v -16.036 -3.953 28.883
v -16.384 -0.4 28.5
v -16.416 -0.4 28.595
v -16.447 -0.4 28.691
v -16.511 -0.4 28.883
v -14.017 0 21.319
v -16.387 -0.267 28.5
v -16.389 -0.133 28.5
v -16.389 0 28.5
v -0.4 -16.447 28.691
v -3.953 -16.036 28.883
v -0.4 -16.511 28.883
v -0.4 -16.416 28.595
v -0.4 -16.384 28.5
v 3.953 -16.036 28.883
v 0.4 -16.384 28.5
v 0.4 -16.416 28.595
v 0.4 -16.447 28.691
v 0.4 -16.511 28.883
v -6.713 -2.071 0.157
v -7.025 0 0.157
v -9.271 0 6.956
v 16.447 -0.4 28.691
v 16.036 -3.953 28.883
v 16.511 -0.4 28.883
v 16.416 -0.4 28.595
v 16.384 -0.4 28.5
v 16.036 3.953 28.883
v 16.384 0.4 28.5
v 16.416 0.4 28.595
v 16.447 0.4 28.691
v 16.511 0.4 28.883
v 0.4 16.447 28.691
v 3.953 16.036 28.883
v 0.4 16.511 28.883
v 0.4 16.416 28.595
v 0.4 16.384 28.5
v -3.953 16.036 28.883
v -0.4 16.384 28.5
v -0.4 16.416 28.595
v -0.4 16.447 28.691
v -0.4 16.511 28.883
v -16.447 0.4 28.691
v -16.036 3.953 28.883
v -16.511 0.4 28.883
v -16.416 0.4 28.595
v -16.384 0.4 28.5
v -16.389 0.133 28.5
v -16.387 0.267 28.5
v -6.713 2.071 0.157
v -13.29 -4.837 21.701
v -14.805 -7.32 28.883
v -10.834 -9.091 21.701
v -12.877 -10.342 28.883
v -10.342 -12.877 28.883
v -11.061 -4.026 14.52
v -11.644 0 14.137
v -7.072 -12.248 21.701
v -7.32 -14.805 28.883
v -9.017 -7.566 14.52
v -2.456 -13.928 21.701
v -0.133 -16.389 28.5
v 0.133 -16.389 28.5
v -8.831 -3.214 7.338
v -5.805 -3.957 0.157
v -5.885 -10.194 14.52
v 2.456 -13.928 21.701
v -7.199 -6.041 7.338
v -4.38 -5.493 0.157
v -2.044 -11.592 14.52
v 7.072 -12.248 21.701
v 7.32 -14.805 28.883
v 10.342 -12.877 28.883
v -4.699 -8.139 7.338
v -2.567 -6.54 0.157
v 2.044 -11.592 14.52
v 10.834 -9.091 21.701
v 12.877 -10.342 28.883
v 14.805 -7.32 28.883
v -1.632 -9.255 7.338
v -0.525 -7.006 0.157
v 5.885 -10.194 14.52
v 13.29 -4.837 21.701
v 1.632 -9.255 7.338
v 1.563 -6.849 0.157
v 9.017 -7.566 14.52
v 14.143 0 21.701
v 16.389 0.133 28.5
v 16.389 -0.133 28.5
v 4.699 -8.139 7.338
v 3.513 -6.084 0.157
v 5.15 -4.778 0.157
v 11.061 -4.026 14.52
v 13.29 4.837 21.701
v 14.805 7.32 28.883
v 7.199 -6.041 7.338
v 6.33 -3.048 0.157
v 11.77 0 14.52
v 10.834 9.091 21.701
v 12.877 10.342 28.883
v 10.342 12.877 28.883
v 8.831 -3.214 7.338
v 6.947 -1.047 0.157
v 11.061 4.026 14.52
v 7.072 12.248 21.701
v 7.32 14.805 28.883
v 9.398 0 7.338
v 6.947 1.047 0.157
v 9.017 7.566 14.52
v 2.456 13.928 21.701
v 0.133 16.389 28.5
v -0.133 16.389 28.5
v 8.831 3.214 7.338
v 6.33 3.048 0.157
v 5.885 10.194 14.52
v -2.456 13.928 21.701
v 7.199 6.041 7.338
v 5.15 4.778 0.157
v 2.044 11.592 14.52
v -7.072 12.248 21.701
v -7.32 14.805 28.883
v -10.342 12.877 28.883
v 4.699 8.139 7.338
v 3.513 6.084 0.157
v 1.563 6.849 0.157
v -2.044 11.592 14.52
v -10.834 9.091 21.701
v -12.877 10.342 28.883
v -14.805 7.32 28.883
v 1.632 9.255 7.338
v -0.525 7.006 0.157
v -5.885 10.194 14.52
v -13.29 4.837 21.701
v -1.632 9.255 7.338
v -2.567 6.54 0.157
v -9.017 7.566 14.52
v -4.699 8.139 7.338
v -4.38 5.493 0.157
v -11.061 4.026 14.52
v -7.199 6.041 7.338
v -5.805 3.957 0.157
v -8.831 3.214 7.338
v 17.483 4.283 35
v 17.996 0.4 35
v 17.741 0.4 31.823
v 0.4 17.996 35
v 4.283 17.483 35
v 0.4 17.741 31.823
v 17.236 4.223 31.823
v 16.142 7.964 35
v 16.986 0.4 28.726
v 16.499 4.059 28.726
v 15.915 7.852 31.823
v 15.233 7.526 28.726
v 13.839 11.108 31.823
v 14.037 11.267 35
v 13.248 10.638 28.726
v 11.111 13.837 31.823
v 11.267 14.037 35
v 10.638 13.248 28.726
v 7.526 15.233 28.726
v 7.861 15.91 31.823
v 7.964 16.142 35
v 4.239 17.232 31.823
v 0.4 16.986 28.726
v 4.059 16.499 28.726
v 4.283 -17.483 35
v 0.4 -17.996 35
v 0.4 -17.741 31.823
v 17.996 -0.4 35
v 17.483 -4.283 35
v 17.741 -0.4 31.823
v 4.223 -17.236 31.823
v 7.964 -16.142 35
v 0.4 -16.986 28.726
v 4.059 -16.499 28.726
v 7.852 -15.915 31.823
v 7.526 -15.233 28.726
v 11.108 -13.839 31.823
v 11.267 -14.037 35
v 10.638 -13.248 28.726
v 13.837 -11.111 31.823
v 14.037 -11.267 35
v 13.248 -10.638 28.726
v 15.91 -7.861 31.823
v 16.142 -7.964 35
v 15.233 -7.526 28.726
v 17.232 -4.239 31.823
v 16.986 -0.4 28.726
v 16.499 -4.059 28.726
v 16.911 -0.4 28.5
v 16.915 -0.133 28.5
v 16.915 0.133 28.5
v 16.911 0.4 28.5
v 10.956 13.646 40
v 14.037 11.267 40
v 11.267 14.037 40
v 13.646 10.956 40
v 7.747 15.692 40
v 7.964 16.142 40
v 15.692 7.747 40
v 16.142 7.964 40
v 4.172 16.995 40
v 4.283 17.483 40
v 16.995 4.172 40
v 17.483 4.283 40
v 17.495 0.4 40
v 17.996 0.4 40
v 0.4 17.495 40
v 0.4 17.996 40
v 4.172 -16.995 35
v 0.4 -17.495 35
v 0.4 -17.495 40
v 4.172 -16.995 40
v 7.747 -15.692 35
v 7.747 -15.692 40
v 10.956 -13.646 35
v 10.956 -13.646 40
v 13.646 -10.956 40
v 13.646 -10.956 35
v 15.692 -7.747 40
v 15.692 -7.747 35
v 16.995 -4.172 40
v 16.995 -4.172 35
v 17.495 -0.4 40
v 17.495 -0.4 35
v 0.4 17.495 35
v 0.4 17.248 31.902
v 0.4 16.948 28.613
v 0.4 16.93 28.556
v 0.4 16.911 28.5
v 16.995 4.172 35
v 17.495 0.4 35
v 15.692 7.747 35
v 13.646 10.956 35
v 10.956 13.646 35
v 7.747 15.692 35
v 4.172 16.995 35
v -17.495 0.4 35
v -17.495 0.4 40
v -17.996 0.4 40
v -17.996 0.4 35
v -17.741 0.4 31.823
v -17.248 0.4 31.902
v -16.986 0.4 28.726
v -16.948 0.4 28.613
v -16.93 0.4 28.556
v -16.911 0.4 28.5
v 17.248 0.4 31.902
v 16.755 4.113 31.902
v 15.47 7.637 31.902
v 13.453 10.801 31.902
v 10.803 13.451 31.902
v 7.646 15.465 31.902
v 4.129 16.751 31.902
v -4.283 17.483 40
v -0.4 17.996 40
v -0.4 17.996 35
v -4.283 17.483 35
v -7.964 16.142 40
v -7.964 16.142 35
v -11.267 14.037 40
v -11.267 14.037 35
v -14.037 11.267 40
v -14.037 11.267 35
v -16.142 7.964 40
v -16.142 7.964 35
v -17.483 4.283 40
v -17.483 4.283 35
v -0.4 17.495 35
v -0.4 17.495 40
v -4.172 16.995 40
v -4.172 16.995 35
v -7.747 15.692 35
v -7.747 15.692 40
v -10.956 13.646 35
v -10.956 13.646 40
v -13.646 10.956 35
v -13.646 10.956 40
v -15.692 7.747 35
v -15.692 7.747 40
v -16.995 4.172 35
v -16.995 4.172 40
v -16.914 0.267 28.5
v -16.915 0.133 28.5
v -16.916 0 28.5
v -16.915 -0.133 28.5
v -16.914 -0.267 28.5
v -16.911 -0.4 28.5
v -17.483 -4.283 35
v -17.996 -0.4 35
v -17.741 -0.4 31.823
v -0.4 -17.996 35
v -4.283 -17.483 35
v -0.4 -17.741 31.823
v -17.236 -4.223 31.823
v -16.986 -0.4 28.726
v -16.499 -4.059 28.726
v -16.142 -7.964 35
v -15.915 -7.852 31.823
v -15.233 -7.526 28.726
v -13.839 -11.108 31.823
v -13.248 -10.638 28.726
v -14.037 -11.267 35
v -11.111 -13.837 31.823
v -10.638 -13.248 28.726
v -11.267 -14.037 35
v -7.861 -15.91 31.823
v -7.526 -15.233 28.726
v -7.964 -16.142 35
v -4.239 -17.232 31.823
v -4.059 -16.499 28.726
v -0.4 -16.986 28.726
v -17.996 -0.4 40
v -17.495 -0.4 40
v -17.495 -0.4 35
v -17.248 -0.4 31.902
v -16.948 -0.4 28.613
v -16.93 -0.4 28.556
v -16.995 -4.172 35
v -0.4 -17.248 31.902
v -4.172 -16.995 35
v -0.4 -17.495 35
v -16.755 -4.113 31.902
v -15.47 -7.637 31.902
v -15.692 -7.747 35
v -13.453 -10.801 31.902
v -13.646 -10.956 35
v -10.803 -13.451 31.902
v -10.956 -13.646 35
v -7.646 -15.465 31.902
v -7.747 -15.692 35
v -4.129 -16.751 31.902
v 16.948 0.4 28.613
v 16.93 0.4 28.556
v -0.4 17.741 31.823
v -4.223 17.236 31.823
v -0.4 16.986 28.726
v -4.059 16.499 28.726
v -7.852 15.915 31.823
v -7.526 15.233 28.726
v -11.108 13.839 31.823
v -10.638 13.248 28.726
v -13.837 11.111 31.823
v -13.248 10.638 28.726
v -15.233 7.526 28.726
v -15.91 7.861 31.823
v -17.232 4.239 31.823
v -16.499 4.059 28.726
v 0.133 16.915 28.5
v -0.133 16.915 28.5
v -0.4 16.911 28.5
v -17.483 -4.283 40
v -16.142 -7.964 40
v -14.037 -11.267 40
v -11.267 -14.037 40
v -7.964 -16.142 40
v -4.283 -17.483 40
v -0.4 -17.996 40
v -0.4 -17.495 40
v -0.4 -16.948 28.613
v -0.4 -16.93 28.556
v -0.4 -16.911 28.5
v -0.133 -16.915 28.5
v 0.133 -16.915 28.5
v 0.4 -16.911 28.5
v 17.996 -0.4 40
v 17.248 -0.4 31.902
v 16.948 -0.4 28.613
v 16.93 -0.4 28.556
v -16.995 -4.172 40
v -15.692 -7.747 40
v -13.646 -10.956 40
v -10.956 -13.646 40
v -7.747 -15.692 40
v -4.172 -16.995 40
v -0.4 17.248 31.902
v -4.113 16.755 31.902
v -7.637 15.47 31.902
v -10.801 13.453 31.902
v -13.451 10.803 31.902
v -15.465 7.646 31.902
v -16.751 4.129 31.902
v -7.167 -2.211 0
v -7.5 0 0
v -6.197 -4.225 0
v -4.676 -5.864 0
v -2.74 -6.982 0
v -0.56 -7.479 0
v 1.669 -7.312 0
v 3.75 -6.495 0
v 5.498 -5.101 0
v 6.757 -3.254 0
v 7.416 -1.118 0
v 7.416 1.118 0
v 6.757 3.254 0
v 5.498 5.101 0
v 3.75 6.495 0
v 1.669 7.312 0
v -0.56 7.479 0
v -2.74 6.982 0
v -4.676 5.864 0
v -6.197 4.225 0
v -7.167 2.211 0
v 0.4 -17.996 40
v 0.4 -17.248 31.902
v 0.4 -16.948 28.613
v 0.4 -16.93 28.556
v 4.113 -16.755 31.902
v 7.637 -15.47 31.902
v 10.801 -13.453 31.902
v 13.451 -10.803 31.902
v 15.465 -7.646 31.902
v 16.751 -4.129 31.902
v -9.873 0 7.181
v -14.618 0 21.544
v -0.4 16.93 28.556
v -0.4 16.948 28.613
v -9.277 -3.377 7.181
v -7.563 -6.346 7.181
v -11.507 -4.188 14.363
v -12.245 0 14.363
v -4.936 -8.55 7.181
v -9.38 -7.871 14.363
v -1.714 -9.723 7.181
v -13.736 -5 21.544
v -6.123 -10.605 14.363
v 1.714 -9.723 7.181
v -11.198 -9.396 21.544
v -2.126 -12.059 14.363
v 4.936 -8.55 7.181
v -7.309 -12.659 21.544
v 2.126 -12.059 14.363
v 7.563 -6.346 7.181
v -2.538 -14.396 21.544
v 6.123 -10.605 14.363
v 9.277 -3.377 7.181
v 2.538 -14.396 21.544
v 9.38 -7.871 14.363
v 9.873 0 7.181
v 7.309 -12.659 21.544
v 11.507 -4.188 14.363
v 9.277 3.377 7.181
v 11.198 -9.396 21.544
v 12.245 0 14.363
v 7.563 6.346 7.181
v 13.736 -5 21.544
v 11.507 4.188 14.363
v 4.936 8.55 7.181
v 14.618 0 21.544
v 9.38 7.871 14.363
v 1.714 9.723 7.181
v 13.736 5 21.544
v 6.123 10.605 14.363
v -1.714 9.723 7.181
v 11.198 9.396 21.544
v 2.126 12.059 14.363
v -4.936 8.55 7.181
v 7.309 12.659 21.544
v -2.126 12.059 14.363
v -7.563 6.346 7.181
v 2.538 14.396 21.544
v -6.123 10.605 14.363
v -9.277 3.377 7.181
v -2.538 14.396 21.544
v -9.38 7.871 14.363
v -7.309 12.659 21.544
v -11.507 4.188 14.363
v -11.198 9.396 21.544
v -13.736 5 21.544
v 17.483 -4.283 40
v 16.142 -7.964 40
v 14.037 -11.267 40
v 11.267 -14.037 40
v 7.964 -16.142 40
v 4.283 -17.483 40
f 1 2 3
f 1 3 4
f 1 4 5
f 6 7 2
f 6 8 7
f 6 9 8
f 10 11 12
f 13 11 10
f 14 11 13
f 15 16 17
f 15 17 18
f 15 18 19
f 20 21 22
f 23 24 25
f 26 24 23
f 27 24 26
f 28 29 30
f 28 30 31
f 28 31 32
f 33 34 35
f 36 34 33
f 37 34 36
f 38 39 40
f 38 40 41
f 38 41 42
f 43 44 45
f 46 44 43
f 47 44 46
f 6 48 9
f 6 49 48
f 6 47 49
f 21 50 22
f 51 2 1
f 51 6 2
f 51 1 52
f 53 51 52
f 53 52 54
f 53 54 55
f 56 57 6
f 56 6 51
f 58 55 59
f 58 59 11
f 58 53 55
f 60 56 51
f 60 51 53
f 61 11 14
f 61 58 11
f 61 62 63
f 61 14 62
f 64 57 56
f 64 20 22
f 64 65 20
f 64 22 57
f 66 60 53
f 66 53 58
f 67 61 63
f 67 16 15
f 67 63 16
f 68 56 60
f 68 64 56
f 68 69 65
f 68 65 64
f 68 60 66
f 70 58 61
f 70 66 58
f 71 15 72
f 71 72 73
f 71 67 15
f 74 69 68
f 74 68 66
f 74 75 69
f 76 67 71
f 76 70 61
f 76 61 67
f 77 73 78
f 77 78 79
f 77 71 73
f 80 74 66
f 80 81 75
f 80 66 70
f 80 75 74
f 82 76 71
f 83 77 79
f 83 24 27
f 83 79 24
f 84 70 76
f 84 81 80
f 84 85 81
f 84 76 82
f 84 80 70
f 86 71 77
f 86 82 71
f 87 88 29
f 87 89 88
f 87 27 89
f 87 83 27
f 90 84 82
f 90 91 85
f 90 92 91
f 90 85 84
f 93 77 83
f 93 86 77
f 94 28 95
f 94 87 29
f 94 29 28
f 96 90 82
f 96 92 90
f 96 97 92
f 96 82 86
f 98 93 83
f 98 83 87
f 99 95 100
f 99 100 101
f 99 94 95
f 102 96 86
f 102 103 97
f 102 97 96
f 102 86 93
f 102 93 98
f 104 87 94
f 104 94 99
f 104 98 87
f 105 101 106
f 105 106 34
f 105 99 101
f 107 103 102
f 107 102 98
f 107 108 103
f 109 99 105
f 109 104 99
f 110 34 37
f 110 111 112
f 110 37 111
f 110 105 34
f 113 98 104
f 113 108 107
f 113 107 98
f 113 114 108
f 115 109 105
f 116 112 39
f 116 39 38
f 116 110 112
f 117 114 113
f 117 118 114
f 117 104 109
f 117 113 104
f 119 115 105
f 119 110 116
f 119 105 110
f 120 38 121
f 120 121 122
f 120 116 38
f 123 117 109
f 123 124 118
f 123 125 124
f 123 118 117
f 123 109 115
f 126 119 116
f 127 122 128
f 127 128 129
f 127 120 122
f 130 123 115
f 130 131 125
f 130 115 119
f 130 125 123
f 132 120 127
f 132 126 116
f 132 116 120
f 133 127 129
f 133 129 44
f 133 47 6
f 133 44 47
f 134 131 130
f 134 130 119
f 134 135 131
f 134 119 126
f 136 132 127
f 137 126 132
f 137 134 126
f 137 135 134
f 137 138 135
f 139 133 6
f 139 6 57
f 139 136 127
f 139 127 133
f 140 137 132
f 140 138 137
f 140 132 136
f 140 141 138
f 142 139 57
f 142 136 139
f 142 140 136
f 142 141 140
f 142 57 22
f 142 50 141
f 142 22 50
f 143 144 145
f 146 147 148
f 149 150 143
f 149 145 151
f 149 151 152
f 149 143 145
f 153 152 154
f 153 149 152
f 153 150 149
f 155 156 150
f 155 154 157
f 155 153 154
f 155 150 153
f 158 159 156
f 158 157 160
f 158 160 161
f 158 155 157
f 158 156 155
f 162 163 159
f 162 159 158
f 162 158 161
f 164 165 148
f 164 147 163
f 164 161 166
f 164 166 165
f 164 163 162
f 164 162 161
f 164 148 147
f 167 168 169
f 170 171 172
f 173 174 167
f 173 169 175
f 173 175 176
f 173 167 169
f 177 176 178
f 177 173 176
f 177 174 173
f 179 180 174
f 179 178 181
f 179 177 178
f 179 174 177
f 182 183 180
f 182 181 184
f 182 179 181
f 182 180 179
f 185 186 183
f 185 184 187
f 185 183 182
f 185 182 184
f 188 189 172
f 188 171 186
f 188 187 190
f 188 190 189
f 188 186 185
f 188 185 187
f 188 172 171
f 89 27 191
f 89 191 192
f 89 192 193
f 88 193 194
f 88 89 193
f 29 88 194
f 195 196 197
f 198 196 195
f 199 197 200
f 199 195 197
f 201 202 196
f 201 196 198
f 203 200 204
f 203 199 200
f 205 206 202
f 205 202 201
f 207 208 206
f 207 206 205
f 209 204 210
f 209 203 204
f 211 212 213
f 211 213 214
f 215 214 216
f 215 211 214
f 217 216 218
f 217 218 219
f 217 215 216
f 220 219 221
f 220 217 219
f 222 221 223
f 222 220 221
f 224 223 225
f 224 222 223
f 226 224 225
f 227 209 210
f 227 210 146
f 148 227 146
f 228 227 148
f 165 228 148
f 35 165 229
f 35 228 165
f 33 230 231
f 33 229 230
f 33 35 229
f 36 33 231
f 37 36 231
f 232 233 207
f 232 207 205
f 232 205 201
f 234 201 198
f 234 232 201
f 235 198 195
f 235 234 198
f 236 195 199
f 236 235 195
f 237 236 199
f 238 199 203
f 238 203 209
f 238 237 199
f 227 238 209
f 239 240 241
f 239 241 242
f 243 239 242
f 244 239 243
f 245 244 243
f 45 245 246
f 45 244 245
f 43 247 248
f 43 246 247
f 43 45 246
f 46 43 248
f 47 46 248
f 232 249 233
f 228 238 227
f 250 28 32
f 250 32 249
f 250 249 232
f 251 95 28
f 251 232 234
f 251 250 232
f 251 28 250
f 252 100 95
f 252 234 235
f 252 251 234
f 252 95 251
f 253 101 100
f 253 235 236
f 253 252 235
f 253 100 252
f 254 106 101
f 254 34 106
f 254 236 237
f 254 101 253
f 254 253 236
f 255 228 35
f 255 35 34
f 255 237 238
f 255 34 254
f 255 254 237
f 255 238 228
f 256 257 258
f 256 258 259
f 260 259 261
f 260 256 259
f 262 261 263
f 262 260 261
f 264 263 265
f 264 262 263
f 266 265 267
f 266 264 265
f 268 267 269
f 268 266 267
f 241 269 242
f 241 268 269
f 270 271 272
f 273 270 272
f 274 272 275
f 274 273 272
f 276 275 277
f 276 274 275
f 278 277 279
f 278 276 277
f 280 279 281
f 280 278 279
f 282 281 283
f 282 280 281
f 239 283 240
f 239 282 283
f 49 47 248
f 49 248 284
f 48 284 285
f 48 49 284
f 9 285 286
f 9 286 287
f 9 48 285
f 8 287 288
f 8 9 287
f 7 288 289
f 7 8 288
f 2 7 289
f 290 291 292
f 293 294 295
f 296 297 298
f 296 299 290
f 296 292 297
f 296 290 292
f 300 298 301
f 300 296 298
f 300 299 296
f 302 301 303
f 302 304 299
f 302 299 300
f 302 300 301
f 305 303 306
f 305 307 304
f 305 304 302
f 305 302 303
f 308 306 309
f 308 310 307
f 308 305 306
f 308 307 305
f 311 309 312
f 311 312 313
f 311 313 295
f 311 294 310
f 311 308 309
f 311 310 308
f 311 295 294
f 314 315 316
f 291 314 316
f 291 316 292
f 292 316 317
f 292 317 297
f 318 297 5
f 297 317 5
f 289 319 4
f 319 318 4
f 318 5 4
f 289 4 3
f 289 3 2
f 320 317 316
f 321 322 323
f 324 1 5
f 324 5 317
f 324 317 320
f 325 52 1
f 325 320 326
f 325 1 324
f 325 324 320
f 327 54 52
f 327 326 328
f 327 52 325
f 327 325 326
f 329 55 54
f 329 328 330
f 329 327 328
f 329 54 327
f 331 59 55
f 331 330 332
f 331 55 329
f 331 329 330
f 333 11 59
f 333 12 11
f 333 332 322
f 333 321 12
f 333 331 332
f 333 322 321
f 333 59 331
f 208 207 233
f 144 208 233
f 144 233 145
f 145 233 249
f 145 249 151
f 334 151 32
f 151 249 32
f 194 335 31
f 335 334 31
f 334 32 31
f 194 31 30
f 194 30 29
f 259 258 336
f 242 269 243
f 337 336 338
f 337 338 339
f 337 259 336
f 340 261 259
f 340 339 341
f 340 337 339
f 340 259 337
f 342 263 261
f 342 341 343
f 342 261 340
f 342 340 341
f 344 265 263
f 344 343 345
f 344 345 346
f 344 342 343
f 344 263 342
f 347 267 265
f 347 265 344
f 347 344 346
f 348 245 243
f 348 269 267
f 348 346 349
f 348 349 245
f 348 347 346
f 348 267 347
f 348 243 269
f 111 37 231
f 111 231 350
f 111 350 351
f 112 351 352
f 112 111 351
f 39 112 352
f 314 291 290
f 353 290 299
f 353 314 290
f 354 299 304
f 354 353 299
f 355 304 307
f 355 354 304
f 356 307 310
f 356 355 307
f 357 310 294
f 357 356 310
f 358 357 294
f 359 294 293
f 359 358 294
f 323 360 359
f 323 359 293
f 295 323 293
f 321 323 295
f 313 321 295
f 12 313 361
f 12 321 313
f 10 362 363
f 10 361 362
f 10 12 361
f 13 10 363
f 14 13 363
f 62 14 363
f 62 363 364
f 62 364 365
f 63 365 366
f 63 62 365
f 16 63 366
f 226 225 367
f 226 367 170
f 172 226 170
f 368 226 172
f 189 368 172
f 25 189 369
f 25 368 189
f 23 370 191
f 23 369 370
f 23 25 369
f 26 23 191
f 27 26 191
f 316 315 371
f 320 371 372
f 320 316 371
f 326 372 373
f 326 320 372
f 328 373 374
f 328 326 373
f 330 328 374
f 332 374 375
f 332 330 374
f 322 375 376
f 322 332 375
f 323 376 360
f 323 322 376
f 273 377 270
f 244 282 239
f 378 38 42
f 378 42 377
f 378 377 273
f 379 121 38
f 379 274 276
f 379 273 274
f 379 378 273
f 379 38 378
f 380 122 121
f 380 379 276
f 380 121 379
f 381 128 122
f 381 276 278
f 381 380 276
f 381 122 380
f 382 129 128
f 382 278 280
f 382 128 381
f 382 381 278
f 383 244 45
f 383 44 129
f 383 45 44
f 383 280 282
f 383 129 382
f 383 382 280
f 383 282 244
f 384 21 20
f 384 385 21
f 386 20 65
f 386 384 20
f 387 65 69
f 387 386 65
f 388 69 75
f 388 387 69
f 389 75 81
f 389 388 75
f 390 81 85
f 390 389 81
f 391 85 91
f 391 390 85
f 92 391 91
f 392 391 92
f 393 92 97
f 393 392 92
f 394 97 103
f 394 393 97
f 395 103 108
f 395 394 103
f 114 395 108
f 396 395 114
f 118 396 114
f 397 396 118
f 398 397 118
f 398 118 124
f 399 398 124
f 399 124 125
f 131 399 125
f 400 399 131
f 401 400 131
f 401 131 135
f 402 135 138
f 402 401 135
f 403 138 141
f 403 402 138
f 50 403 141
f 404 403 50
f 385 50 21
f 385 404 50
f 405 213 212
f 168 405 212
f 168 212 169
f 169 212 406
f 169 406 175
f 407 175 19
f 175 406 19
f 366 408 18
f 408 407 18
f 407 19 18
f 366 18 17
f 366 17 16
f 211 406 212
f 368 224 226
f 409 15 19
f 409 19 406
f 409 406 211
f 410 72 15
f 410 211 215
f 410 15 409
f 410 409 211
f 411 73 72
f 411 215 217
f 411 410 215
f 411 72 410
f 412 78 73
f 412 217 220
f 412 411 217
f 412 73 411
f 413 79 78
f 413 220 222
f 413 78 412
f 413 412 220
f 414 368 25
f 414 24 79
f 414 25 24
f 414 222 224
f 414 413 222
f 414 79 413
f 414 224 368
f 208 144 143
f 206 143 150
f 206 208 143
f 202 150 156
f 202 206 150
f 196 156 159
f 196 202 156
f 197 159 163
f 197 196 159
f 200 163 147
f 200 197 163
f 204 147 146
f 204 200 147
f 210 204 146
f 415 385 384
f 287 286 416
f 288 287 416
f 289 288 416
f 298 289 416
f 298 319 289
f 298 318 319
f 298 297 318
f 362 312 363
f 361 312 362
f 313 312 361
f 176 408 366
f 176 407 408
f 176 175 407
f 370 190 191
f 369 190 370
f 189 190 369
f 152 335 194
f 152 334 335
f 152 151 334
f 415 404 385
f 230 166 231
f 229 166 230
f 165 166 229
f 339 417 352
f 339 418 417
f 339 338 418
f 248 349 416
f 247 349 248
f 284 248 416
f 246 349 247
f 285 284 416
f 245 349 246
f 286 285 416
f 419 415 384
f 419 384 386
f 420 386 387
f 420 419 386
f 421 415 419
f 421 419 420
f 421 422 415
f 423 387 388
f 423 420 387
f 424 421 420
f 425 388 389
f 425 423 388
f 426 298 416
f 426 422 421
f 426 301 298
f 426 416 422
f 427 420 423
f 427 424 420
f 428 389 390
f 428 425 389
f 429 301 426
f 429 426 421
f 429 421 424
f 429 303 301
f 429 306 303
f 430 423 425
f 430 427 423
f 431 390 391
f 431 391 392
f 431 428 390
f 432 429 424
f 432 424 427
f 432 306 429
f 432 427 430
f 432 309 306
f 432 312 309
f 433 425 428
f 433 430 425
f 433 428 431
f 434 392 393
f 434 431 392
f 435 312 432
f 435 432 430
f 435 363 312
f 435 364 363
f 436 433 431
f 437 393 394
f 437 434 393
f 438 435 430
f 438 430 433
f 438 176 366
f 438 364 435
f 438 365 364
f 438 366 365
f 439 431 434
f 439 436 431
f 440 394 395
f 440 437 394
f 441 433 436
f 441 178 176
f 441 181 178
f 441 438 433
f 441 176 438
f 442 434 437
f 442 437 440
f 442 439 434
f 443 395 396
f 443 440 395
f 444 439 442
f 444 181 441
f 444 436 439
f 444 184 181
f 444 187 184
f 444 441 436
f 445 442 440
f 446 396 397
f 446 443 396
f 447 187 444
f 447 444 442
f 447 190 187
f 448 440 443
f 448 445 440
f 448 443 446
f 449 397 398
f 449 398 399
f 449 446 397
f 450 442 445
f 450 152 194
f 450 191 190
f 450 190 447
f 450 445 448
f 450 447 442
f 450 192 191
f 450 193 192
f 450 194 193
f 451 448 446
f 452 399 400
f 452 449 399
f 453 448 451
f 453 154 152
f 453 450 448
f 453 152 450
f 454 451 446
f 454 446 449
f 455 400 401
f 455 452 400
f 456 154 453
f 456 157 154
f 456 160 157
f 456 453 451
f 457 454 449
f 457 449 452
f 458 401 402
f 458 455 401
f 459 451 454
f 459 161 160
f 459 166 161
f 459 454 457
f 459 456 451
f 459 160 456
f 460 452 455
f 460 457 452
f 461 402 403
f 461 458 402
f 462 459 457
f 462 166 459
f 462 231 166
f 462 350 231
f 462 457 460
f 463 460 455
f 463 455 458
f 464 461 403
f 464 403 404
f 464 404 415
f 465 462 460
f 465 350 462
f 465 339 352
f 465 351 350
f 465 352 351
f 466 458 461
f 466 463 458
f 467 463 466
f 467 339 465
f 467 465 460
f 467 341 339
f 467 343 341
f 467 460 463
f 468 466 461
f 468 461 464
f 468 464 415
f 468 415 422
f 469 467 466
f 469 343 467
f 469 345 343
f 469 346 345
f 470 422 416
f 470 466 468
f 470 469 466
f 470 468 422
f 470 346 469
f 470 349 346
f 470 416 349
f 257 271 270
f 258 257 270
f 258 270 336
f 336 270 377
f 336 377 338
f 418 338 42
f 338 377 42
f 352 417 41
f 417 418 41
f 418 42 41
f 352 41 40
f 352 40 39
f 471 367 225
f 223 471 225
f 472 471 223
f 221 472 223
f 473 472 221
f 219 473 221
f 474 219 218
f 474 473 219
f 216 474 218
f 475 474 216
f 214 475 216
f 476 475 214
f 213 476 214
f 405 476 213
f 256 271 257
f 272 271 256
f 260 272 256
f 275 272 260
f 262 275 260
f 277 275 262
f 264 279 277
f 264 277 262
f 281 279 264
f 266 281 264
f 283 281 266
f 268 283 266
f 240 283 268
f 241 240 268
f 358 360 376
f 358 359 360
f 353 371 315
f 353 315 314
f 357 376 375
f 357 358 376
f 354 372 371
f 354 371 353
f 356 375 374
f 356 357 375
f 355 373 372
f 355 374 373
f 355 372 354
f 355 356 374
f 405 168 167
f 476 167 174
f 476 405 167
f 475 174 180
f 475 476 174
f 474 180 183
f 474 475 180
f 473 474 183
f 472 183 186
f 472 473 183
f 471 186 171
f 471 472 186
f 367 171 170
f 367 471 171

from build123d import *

# Parameters (mm, degrees)
SKETCH2_W          = 0.8
SKETCH2_H          = 11.5
CUT_EXTRUDE1_DEPTH = 48.41307844
CIRPATTERN1_COUNT  = 4


with BuildPart() as part:
    # Sketch1 → Revolve-Thin1 (revolve)
    with BuildSketch(Plane(origin=(0, 0, 0), x_dir=(0, 0, -1), z_dir=(1, 0, 0))):
        with BuildLine():
            Line((0, 7.5), (-28.725975148, 16.990434754))
            ThreePointArc((-28.725975148, 16.990434754), (-31.822634352, 17.745995734), (-35, 18))
            Line((-35, 18), (-40, 18))
            Line((-40, 18), (-40, 17.5))
            Line((-40, 17.5), (-35, 17.5))
            ThreePointArc((-35, 17.5), (-31.902068494, 17.252345841), (-28.882825769, 16.515673885))
            Line((-28.882825769, 16.515673885), (-0.156850621, 7.025239131))
            Line((-0.156850621, 7.025239131), (0, 7.5))
        make_face()
    revolve(axis=Axis((0, 0, 0), (0, 0, 1)))

    # Sketch2 → Cut-Extrude1 (cut, through all)
    with BuildSketch(Plane(origin=(0, 0, 0), x_dir=(1, 0, 0), z_dir=(0, 1, 0))):
        with Locations((0, -34.25)):
            Rectangle(SKETCH2_W, SKETCH2_H)
    cut_extrude1 = extrude(amount=-CUT_EXTRUDE1_DEPTH, mode=Mode.SUBTRACT)

    # CirPattern1: Cut-Extrude1 ×4 about axis
    cirpattern1_axis = Axis((0, 0, 44.270736316), (0, 0, -1))
    for i in range(1, CIRPATTERN1_COUNT):
        add(cut_extrude1.rotate(cirpattern1_axis, i * 360 / CIRPATTERN1_COUNT), mode=Mode.SUBTRACT)


solid = part.part
